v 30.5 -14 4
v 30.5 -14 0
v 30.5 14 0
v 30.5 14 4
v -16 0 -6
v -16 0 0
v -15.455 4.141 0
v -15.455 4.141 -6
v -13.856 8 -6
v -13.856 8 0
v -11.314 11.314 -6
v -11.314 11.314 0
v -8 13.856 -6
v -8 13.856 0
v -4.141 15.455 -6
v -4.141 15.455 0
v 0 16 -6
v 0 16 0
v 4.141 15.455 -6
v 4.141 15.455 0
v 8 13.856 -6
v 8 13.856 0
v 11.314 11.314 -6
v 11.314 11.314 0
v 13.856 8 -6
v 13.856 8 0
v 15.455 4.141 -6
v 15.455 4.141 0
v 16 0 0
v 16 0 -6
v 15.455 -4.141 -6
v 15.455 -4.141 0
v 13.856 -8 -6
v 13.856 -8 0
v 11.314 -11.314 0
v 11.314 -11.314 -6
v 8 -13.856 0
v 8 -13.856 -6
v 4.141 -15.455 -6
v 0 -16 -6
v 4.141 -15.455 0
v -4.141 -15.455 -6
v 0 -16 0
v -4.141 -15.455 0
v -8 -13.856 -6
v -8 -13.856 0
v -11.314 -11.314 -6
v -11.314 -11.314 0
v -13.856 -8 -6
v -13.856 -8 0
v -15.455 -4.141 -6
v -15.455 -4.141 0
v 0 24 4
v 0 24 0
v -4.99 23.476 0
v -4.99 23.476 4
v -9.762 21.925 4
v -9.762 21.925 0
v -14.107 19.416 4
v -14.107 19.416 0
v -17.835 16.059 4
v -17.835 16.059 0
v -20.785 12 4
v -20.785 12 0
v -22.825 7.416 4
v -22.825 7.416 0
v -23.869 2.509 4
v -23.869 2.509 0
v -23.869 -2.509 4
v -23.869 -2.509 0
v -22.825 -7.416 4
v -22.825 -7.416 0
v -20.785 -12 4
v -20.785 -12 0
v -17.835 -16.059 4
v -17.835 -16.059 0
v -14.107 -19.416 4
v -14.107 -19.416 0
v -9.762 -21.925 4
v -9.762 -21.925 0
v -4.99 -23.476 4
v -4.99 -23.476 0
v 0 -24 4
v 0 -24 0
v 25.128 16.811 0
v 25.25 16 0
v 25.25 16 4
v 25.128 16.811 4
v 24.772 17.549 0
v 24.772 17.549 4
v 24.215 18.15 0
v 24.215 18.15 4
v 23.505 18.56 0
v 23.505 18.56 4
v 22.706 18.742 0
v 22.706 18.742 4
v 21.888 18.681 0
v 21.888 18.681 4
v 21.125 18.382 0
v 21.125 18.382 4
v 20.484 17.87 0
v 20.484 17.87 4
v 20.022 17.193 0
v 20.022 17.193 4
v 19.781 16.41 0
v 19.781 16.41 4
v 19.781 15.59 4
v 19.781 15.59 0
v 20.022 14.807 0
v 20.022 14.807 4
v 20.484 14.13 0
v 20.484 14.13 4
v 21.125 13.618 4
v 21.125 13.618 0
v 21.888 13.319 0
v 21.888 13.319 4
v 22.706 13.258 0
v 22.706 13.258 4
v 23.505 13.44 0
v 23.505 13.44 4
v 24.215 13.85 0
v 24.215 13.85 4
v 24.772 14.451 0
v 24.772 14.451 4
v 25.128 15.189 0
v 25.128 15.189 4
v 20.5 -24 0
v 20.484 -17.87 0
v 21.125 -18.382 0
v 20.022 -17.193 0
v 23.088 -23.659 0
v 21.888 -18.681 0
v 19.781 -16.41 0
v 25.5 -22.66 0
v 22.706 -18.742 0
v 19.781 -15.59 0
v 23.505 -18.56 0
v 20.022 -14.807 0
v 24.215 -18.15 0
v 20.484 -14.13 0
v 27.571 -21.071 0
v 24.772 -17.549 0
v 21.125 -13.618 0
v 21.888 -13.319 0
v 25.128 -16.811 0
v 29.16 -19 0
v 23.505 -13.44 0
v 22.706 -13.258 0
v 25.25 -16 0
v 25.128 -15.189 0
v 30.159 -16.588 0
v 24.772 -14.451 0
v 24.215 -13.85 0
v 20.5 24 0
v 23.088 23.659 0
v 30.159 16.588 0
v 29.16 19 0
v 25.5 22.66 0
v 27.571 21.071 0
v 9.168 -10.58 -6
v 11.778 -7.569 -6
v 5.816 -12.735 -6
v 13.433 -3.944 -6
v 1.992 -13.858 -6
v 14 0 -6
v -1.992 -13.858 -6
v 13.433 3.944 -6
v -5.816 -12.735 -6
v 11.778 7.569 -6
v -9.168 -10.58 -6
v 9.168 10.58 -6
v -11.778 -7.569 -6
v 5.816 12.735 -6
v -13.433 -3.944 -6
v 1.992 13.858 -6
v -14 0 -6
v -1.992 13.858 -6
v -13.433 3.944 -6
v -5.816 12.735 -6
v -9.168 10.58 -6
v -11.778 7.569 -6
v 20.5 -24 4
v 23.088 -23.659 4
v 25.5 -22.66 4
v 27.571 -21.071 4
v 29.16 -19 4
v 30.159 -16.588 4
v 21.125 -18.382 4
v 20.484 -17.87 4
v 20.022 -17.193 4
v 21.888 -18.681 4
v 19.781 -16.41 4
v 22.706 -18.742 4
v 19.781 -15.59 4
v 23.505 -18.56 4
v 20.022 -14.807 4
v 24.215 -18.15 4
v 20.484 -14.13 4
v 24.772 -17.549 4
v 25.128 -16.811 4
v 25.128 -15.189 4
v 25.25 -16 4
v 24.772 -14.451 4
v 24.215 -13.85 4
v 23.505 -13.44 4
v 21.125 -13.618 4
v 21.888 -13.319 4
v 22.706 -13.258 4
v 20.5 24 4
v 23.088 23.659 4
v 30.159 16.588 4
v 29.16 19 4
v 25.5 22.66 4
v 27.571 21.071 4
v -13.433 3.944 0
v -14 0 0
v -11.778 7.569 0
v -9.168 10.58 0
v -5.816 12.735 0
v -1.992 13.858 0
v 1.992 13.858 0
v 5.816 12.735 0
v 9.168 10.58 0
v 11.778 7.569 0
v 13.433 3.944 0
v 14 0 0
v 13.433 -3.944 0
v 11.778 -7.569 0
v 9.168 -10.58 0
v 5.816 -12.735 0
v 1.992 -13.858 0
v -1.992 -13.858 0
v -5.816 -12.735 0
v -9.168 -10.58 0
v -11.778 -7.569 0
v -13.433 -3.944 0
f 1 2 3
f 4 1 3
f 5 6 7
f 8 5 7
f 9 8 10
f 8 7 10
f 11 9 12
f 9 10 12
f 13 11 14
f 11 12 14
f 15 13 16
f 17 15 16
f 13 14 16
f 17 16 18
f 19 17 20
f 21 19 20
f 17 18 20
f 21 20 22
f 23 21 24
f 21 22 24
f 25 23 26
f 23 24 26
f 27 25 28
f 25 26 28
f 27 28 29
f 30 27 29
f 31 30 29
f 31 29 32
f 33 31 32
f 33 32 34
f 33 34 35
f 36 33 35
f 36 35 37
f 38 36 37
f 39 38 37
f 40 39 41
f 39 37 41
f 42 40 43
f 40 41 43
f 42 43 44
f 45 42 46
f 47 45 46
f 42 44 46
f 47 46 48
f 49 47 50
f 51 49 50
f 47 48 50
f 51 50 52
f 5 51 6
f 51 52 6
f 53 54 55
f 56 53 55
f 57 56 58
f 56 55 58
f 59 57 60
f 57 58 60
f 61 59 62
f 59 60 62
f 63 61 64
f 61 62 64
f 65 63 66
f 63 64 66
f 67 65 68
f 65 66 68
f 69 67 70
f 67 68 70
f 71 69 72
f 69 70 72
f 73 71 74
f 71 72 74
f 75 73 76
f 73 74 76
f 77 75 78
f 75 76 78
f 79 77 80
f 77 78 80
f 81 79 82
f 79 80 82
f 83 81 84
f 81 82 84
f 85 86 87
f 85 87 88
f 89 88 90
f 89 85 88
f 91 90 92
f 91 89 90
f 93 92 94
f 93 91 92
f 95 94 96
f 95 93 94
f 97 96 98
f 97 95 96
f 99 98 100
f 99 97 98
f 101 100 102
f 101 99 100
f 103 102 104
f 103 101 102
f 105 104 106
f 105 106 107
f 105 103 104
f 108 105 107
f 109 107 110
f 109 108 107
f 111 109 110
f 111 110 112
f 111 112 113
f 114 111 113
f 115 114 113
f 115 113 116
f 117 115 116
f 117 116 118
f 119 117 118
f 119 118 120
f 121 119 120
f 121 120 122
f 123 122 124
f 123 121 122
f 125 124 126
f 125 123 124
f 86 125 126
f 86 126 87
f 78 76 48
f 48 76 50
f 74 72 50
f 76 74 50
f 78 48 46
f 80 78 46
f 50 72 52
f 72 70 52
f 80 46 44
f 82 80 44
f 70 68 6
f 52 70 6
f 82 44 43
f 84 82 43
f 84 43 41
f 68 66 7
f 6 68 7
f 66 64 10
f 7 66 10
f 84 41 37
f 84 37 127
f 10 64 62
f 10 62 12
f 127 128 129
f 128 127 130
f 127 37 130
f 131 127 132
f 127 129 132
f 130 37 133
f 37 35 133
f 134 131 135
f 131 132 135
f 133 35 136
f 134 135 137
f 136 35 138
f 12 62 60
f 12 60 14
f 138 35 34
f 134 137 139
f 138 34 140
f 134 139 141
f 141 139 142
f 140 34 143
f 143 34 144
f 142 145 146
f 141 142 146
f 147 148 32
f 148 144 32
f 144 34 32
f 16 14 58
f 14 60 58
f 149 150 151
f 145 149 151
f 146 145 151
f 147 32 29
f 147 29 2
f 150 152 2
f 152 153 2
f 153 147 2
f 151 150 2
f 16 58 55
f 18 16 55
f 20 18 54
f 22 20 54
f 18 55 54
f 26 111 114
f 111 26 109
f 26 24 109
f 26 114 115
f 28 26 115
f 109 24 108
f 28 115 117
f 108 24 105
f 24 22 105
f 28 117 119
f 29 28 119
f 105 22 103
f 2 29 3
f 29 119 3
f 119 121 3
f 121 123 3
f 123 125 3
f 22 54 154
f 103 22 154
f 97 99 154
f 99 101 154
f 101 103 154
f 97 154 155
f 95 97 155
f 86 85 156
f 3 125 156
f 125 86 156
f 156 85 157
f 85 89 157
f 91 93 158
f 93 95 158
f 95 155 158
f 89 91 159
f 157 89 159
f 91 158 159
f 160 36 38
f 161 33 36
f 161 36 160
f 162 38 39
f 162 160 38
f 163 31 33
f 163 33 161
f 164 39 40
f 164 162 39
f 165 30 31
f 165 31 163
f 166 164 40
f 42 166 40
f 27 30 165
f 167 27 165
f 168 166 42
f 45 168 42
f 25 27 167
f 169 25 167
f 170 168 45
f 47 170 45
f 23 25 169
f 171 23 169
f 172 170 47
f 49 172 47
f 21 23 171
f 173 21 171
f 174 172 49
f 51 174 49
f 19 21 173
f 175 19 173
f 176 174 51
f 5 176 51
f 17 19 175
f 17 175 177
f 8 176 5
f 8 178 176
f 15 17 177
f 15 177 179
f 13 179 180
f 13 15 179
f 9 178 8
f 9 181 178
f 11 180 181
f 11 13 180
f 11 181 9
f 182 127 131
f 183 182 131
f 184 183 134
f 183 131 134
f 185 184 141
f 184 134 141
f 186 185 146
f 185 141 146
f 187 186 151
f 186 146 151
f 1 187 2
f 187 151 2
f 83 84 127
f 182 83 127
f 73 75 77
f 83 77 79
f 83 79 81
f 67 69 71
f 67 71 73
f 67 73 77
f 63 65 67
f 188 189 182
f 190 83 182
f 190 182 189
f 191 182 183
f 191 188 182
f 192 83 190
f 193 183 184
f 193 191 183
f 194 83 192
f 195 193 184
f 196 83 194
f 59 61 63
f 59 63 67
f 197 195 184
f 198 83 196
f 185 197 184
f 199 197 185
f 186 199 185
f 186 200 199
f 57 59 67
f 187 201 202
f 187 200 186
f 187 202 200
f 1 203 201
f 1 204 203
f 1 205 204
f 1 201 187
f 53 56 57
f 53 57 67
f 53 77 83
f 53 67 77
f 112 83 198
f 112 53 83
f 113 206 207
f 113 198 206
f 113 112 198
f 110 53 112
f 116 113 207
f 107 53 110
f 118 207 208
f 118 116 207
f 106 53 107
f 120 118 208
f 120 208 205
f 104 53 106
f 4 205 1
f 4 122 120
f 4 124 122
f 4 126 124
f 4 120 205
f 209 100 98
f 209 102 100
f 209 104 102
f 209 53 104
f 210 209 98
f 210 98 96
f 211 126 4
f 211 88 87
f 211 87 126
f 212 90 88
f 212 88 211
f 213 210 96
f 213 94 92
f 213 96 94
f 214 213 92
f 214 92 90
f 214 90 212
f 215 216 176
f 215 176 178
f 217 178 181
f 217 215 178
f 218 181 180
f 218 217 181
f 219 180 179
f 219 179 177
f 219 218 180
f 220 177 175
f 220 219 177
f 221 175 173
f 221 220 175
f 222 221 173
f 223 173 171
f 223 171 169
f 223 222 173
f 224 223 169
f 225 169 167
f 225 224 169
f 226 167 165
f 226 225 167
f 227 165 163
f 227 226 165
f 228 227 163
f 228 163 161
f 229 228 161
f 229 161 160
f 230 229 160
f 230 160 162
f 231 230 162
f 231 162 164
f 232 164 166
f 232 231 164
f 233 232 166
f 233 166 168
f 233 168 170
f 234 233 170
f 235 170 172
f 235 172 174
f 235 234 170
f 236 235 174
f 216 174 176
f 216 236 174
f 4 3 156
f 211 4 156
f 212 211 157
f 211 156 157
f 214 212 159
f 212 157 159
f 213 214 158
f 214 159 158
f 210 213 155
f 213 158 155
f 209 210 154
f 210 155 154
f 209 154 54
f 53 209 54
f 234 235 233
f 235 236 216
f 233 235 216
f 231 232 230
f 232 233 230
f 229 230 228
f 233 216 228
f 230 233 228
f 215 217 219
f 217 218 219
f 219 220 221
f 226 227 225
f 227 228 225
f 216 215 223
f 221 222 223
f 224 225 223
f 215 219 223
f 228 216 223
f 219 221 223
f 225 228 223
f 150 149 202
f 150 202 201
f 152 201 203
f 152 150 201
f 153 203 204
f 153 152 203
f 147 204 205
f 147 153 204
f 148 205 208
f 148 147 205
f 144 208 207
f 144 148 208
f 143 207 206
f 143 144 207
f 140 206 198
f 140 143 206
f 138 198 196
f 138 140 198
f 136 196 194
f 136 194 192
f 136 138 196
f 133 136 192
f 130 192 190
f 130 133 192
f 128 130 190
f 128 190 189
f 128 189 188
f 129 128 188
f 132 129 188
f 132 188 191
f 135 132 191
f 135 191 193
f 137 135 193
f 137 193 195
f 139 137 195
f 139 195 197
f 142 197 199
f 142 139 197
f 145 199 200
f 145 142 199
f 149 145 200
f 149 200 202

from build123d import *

# Parameters (mm, degrees)
SKETCH1_R           = 2.75
BOSS_EXTRUDE1_DEPTH = 4
SKETCH2_R           = 16
SKETCH2_R_2         = 14
BOSS_EXTRUDE2_DEPTH = 6


with BuildPart() as part:
    # Sketch1 → Boss-Extrude1 (new body)
    with BuildSketch(Plane.XY):
        with BuildLine():
            Line((0, -24), (20.5, -24))
            ThreePointArc((20.5, -24), (27.571067812, -21.071067812), (30.5, -14))
            Line((30.5, -14), (30.5, 14))
            ThreePointArc((30.5, 14), (27.571067812, 21.071067812), (20.5, 24))
            Line((20.5, 24), (0, 24))
            ThreePointArc((0, 24), (-24, 0), (0, -24))
        make_face()
        with Locations((22.5, -16)):
            Circle(SKETCH1_R, mode=Mode.SUBTRACT)
        with Locations((22.5, 16)):
            Circle(SKETCH1_R, mode=Mode.SUBTRACT)
    extrude(amount=BOSS_EXTRUDE1_DEPTH)

    # Sketch2 → Boss-Extrude2 (add)
    with BuildSketch(Plane(origin=(0, 0, 0), x_dir=(-1, 0, 0), z_dir=(0, 0, -1))):
        Circle(SKETCH2_R)
        Circle(SKETCH2_R_2, mode=Mode.SUBTRACT)
    extrude(amount=BOSS_EXTRUDE2_DEPTH)


solid = part.part
